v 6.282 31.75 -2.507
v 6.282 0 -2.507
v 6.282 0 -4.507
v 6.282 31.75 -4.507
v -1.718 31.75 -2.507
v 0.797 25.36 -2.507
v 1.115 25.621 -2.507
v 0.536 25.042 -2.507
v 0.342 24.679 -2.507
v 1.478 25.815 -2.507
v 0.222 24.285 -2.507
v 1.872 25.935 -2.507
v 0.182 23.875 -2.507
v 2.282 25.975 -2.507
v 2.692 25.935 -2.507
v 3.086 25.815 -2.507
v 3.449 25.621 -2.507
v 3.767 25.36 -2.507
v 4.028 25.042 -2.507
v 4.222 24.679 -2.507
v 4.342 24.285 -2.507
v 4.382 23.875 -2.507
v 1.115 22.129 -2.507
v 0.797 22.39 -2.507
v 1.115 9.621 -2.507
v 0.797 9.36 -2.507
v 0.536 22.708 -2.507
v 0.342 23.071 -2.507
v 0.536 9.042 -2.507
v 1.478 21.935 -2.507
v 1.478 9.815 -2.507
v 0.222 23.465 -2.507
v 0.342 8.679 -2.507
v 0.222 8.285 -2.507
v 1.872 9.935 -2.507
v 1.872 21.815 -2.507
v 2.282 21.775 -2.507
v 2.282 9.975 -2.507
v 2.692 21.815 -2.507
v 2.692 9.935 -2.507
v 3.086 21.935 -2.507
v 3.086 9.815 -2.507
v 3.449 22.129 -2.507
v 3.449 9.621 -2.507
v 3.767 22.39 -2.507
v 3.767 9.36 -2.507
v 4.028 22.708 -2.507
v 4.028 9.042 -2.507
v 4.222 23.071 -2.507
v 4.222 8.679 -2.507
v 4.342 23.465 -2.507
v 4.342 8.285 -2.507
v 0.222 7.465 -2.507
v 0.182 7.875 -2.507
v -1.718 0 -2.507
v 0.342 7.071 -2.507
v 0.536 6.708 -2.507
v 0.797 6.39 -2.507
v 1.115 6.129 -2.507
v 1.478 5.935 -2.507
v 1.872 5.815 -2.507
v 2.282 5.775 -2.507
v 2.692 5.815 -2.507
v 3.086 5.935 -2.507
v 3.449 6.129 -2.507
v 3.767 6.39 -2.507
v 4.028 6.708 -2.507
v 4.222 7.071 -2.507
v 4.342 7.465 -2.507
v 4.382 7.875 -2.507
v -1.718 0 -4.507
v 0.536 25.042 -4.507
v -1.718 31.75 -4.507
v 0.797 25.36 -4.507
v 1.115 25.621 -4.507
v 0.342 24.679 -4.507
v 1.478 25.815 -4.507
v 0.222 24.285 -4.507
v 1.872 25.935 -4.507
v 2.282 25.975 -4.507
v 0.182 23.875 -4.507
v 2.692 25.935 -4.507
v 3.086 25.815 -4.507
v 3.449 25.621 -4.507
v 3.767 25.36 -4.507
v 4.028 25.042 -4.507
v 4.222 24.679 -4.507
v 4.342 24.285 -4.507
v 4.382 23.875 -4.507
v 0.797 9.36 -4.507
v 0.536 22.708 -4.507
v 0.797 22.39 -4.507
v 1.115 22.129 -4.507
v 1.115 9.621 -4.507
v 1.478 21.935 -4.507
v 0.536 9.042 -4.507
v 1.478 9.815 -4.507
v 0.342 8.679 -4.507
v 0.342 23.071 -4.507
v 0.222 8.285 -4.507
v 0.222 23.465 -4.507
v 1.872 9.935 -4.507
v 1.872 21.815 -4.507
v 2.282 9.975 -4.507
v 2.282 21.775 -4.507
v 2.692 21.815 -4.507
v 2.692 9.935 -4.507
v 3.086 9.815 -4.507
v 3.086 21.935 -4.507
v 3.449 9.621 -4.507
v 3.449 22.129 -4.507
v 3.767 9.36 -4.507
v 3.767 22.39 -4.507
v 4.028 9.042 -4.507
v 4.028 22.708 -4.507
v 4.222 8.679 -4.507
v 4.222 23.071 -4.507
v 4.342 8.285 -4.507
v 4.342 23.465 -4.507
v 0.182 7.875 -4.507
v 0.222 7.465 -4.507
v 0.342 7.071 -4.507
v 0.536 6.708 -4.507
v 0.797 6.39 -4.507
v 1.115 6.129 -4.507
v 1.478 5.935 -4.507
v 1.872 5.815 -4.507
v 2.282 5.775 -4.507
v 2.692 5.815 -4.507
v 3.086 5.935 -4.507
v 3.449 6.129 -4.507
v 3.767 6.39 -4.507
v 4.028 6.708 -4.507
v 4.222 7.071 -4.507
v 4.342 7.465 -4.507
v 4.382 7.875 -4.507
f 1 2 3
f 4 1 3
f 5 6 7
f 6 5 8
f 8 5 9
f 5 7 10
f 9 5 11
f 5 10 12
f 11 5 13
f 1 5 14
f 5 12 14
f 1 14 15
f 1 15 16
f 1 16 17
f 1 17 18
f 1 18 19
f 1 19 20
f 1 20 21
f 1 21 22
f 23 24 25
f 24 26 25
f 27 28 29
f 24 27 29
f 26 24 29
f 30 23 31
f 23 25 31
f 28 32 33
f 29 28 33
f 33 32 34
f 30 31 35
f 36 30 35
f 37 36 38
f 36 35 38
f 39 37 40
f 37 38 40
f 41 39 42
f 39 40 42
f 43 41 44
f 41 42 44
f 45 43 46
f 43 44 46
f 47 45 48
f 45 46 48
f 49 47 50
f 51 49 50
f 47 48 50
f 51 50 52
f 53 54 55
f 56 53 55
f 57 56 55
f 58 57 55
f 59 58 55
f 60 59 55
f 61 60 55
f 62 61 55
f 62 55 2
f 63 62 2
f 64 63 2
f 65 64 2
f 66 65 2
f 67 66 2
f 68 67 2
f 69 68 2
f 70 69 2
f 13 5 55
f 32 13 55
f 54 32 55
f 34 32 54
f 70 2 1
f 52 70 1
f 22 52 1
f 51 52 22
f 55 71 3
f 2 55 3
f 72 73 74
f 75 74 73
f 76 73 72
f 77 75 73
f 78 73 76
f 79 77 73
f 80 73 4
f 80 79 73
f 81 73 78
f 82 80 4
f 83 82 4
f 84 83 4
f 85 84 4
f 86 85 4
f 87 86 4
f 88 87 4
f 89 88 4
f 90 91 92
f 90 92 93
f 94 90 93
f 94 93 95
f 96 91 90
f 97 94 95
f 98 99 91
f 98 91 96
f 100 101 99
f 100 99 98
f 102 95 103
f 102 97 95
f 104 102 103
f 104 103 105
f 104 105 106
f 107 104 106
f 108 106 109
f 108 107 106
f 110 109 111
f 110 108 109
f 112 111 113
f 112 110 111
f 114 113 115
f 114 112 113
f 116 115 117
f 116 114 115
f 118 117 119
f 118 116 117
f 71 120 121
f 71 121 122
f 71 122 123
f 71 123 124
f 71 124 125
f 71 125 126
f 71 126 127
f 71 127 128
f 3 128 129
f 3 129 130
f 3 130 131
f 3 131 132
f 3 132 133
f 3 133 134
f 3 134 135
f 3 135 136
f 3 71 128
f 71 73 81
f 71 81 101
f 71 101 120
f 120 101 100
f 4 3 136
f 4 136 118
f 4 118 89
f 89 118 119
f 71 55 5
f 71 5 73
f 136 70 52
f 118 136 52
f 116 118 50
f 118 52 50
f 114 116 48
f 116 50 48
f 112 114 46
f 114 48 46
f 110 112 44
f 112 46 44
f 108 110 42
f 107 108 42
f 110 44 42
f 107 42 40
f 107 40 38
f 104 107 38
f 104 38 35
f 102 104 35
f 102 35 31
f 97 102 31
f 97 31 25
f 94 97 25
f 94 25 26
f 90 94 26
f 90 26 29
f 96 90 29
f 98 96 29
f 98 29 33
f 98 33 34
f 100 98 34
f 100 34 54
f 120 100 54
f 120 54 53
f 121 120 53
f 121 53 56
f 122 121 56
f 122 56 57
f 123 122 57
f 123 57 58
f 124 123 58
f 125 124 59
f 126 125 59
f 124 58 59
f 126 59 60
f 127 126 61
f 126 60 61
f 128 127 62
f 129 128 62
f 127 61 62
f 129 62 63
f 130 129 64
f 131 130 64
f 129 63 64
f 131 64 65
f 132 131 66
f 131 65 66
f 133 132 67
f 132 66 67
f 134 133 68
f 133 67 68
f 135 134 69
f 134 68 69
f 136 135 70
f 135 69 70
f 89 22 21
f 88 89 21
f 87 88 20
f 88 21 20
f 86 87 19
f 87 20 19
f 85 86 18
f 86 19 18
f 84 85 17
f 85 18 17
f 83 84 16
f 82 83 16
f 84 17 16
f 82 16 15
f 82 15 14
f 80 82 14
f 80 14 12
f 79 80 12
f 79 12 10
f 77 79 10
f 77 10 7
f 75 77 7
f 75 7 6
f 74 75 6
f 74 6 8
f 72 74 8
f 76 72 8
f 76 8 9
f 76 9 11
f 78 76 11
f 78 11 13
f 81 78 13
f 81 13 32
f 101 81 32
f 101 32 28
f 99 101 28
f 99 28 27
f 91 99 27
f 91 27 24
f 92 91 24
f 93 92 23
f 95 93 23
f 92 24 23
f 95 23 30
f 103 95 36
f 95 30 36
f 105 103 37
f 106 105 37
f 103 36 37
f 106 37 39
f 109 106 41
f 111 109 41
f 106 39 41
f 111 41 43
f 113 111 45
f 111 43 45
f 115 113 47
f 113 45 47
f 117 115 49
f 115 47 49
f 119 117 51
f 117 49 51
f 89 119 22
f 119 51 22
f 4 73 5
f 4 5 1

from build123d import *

# Parameters (mm, degrees)
SKETCH3_W           = 8
SKETCH3_H           = 2
BOSS_EXTRUDE2_DEPTH = 31.75
SKETCH4_R           = 2.1
CUT_EXTRUDE1_DEPTH  = 3


with BuildPart() as part:
    # Sketch3 → Boss-Extrude2 (new body)
    with BuildSketch(Plane(origin=(0, 0, 0), x_dir=(1, 0, 0), z_dir=(0, 1, 0))):
        with Locations((2.282032354, 3.507256135)):
            Rectangle(SKETCH3_W, SKETCH3_H)
    extrude(amount=BOSS_EXTRUDE2_DEPTH)

    # Sketch4 → Cut-Extrude1 (cut, through all)
    with BuildSketch(Plane.XY.offset(-2.507256135)):
        with Locations((2.282032354, 7.875)):
            Circle(SKETCH4_R)
        with Locations((2.282032354, 23.875)):
            Circle(SKETCH4_R)
    extrude(amount=-CUT_EXTRUDE1_DEPTH, mode=Mode.SUBTRACT)


solid = part.part
